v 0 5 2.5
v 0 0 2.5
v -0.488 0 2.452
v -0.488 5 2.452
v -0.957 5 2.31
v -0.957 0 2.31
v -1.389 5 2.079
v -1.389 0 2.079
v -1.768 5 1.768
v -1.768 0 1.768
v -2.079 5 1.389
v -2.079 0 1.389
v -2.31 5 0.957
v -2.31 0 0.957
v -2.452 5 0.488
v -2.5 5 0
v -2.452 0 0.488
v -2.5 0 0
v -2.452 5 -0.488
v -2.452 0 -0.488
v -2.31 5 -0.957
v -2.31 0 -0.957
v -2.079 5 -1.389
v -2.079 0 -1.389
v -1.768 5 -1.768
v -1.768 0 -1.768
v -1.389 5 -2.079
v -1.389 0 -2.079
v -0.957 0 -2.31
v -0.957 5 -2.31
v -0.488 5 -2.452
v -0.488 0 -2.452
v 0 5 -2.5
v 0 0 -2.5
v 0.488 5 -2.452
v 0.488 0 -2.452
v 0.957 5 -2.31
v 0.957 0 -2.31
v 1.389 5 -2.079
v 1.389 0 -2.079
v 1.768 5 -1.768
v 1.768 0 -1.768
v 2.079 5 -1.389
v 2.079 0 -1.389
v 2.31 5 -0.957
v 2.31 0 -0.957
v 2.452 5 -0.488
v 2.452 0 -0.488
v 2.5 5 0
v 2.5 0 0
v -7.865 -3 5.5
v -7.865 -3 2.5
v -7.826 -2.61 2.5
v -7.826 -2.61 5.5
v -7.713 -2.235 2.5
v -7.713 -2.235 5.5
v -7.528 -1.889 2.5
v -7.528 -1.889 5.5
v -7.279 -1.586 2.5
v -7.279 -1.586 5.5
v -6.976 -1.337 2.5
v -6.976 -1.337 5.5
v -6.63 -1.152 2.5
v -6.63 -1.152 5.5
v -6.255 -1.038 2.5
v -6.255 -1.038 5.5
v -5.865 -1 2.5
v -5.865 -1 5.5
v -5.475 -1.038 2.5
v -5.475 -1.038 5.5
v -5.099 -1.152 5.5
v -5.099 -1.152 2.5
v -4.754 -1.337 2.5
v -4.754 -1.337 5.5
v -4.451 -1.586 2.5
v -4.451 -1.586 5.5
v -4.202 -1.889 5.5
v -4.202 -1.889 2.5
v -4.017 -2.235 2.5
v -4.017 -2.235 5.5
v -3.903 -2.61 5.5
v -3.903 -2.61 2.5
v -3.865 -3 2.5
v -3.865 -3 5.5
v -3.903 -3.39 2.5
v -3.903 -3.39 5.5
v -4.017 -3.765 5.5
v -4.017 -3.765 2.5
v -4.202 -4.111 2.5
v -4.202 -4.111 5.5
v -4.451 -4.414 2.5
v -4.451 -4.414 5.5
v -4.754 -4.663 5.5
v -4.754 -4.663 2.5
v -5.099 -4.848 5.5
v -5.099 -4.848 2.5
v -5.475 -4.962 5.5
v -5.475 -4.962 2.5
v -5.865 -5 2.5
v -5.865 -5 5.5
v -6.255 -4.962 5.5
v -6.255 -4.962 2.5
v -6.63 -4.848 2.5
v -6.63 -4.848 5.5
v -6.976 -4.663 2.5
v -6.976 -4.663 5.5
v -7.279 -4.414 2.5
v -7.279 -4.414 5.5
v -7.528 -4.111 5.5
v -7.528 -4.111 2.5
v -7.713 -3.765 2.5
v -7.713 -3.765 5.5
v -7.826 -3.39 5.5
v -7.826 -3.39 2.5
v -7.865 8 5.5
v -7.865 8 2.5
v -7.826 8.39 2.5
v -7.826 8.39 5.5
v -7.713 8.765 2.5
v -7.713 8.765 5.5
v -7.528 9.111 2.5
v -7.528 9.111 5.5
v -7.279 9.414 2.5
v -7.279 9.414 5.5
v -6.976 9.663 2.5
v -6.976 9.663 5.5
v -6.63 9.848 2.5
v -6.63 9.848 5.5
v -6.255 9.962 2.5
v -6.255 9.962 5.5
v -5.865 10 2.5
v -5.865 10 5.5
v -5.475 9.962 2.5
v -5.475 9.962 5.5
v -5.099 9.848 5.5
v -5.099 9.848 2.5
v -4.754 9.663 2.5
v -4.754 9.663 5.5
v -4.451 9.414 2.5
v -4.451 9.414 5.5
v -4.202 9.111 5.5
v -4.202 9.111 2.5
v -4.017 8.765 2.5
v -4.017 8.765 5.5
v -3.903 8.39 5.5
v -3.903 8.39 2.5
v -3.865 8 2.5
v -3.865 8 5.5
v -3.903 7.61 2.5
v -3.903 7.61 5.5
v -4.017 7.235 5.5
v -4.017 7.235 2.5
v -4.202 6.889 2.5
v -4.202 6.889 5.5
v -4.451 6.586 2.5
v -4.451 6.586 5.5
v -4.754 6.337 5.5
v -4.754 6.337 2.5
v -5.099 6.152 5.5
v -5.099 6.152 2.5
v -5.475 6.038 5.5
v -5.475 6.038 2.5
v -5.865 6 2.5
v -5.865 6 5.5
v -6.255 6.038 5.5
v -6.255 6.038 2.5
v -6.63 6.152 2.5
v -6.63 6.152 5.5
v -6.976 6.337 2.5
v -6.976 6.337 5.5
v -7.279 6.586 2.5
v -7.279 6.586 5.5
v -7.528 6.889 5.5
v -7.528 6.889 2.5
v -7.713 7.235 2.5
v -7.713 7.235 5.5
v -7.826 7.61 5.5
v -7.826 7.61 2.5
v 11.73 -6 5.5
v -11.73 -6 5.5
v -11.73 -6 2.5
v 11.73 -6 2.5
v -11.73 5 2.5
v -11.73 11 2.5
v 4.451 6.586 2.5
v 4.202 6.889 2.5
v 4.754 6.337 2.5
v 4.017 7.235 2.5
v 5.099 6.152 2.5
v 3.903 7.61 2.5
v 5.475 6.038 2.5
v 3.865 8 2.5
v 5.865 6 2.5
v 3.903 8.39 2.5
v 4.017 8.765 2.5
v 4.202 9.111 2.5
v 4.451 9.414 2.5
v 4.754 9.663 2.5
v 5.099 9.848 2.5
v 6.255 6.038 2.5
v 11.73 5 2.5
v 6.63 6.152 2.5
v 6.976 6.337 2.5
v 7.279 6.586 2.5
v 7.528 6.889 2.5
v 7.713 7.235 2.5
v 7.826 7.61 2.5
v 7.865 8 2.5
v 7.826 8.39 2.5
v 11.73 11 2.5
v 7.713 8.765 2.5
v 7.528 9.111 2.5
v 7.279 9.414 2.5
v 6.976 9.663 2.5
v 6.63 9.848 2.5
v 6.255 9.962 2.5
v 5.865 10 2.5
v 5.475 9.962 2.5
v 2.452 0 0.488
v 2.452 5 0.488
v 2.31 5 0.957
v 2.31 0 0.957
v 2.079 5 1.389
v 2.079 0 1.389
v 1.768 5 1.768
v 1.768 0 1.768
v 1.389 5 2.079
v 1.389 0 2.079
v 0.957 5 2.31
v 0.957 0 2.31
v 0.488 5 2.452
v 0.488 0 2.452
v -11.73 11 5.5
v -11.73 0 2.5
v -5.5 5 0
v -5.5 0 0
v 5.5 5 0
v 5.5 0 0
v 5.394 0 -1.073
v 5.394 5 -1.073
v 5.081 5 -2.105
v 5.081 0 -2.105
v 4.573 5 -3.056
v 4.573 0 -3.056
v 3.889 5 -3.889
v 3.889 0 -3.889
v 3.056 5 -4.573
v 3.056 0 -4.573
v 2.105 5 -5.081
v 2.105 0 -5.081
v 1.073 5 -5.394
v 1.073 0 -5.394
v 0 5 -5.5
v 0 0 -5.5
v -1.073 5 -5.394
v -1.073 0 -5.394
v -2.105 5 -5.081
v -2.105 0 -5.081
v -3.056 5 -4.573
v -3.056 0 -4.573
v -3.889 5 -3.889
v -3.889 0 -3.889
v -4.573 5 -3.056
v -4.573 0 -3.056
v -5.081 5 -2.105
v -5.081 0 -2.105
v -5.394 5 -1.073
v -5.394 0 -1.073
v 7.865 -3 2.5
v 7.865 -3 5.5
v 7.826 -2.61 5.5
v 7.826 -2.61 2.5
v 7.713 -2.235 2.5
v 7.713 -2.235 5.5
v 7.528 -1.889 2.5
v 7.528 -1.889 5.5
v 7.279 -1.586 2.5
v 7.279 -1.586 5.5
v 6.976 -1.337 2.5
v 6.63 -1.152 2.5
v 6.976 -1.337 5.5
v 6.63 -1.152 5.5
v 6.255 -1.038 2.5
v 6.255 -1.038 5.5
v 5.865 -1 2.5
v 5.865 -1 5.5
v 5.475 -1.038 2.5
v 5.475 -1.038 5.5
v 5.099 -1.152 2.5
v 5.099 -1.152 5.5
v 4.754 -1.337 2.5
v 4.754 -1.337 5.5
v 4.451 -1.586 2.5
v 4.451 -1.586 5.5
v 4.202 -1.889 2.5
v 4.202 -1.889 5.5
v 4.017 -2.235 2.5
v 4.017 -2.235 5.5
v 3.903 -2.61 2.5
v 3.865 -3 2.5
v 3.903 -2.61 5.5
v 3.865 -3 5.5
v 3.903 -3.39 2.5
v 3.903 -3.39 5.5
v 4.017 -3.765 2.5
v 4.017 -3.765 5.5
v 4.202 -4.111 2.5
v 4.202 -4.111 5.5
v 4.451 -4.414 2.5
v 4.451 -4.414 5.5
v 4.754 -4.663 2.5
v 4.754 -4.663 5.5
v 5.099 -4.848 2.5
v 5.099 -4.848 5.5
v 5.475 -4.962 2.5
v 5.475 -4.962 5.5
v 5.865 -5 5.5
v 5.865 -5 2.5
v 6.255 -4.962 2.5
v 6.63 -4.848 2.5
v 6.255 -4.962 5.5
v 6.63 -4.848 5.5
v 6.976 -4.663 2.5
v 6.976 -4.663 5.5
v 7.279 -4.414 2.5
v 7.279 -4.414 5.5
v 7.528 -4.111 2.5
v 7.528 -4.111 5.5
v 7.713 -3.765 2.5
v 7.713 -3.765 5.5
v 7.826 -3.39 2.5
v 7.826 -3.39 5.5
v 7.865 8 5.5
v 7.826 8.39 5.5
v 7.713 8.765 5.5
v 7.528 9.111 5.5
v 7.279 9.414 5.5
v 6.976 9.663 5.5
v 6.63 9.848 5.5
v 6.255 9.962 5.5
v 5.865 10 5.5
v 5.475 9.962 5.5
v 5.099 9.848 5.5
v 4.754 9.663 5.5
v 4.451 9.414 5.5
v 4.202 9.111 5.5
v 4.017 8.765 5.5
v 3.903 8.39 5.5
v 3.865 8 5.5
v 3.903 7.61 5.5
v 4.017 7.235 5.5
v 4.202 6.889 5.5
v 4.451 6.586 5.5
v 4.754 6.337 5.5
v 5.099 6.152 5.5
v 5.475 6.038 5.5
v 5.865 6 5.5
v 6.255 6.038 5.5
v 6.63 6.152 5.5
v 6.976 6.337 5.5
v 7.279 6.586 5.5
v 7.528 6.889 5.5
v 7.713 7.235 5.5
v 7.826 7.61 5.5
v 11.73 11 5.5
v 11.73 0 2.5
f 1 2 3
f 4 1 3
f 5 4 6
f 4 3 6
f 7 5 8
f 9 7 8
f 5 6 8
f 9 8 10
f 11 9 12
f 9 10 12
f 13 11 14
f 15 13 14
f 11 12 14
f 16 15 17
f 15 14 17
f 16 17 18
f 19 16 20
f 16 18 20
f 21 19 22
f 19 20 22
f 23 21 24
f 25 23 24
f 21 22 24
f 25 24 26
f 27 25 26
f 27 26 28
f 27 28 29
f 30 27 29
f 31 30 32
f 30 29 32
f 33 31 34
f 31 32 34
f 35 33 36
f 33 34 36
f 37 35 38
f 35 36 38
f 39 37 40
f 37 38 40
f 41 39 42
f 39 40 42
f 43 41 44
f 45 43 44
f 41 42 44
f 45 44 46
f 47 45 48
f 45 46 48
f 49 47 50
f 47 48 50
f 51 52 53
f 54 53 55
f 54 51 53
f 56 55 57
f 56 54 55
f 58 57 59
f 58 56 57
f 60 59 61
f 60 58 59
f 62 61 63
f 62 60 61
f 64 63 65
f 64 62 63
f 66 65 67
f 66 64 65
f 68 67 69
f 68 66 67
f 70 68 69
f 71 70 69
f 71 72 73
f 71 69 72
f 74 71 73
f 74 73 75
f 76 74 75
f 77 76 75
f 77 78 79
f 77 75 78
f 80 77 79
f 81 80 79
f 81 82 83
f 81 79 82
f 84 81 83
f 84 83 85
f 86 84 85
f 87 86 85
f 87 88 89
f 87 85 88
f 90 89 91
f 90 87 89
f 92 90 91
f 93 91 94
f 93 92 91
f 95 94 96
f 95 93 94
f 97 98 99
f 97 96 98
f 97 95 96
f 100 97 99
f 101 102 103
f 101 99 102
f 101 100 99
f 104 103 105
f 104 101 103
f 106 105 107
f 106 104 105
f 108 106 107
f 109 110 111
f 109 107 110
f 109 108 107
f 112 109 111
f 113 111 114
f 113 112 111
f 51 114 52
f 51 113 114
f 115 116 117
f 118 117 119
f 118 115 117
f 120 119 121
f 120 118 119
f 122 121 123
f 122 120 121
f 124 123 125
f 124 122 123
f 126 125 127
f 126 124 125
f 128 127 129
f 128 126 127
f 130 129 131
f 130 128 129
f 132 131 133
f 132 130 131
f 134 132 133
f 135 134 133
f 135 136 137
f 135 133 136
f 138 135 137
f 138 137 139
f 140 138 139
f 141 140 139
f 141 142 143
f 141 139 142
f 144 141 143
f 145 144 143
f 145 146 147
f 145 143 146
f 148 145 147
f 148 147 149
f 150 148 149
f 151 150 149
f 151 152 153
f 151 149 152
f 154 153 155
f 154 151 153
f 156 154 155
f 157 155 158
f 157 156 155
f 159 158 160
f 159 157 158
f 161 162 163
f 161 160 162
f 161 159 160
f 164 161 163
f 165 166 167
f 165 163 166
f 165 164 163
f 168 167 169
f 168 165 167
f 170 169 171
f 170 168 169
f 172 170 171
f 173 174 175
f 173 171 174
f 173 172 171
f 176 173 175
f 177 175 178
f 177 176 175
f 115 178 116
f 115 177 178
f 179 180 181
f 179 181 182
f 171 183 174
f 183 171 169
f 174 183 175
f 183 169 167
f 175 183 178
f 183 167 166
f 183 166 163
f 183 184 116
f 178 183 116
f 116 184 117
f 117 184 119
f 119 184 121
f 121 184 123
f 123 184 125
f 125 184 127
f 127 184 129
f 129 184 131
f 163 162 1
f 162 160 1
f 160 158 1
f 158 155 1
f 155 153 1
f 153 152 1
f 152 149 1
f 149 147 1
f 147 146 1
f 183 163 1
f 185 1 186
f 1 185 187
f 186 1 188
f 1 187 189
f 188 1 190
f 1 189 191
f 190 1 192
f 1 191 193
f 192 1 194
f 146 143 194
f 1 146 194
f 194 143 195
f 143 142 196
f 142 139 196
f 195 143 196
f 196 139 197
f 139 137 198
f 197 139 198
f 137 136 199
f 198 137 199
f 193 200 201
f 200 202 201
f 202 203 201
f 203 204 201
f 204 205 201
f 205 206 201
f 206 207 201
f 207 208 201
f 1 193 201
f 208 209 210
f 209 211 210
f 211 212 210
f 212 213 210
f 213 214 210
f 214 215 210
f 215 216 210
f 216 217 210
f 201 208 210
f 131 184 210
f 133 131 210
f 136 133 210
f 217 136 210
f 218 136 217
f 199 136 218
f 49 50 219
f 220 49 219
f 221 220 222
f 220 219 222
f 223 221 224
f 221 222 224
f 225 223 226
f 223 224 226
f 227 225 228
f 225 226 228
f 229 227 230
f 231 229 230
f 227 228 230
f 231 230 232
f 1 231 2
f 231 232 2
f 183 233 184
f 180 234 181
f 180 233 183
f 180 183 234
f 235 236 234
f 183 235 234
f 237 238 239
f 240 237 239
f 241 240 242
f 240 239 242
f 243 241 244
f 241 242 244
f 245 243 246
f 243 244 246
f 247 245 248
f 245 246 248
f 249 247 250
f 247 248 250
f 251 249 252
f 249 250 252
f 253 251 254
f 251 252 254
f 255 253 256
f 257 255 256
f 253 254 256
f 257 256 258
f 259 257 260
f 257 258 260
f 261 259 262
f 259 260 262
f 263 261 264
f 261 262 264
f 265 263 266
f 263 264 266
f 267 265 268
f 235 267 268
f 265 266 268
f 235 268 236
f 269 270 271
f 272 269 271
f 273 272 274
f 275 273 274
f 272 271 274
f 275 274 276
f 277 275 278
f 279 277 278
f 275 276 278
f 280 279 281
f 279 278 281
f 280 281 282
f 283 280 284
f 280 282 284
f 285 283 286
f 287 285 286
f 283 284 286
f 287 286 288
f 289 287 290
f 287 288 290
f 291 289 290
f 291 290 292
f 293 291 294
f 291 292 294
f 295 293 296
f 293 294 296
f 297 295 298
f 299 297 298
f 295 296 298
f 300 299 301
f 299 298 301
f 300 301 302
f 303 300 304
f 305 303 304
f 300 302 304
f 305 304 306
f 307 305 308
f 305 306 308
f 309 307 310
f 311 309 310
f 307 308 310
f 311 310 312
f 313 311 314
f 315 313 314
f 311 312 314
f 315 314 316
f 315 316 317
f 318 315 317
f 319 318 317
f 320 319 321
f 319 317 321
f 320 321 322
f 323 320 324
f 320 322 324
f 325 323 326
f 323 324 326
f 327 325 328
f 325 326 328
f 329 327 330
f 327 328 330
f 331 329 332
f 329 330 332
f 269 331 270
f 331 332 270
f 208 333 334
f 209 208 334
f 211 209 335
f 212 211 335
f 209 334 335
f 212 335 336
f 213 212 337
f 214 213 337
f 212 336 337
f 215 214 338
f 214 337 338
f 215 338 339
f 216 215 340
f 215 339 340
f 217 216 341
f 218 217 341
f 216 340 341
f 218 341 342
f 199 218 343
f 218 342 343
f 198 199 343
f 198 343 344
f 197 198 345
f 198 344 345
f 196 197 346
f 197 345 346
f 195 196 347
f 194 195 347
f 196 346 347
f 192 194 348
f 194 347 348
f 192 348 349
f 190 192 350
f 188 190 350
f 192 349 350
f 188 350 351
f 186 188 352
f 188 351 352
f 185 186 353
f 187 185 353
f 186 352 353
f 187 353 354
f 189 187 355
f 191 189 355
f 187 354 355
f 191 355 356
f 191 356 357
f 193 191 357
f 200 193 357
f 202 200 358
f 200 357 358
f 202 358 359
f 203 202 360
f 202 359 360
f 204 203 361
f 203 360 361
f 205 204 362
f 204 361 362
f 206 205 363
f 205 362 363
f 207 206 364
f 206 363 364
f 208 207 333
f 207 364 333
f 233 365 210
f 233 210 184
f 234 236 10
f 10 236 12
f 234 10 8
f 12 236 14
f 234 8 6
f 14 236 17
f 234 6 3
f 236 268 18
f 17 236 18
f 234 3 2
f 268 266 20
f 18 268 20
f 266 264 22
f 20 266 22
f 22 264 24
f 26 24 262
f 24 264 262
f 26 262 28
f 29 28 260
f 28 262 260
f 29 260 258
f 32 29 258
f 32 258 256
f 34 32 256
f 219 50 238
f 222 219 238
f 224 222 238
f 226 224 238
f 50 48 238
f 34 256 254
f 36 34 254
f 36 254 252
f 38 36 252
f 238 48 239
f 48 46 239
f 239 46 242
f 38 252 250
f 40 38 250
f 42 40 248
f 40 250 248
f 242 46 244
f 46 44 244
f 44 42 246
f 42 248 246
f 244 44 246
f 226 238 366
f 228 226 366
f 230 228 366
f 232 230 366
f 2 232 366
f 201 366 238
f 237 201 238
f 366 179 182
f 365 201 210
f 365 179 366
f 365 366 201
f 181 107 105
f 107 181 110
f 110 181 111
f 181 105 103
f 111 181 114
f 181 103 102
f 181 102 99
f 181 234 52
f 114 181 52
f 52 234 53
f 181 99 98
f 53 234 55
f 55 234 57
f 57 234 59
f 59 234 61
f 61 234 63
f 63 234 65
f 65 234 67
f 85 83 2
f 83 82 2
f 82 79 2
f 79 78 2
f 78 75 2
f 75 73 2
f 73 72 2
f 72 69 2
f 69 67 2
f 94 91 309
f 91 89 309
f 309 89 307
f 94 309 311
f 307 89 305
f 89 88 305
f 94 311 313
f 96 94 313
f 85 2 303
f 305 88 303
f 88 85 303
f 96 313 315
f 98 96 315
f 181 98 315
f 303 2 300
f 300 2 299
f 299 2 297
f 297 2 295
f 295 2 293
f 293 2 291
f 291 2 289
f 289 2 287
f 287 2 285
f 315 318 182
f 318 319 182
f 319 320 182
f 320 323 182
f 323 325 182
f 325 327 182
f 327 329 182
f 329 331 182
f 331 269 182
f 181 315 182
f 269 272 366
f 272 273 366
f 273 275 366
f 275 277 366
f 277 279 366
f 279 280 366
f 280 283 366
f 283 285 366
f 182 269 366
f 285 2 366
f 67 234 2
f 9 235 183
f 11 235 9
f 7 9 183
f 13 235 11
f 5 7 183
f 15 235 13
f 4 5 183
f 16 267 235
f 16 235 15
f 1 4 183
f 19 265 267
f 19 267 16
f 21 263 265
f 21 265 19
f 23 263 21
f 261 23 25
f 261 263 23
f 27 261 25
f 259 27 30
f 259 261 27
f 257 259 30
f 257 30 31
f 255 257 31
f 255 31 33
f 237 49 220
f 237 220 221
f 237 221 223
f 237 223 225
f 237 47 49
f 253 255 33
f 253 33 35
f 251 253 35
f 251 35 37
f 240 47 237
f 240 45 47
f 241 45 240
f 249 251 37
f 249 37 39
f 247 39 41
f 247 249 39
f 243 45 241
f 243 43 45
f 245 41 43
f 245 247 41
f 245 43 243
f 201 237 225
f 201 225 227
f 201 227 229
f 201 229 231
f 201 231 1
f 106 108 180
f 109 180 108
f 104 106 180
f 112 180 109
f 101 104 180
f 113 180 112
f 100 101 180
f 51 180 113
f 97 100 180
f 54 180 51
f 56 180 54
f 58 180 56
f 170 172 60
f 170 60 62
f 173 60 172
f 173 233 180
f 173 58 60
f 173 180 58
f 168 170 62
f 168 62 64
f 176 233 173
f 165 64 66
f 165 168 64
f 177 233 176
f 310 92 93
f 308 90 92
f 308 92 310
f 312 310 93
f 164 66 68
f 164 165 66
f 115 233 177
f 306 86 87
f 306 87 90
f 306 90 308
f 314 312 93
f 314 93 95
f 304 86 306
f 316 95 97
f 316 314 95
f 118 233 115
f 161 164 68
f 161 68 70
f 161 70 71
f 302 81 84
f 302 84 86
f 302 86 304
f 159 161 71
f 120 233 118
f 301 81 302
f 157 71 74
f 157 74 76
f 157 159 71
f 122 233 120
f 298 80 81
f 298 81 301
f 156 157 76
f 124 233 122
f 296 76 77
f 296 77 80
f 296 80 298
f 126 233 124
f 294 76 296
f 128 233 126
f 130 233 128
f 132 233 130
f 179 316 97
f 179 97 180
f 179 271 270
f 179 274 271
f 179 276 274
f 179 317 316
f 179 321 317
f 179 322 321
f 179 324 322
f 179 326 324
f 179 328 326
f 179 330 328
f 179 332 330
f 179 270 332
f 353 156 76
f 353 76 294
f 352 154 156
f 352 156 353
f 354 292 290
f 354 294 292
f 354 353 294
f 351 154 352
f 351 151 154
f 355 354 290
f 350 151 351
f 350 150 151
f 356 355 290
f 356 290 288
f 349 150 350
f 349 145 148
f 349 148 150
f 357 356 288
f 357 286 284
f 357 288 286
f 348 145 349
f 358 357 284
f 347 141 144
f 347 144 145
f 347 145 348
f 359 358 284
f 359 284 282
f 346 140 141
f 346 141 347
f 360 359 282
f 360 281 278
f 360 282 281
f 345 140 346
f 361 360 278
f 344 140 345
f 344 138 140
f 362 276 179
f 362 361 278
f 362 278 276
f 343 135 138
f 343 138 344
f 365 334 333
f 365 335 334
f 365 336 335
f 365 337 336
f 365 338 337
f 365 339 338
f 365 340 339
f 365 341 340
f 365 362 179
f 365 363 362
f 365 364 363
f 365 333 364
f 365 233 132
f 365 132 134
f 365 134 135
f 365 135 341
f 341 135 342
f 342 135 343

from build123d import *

# Parameters (mm, degrees)
BOSS_EXTRUDE1_DEPTH = 5
SKETCH2_R           = 2
CUT_EXTRUDE1_DEPTH  = 5
SKETCH5_W           = 10
SKETCH5_H           = 5
CUT_EXTRUDE2_DEPTH  = 5
SKETCH6_R           = 2
BOSS_EXTRUDE4_DEPTH = 3


with BuildPart() as part:
    # Sketch1 → Boss-Extrude1 (new body)
    # profile 1 of 9: a face of its own
    with BuildSketch(Plane(origin=(0, 0, 0), x_dir=(1, 0, 0), z_dir=(0, 1, 0))):
        with BuildLine():
            ThreePointArc((4.898979486, -2.5), (5.347634392, -1.285615189), (5.5, 0))
            ThreePointArc((5.5, 0), (0, 5.5), (-5.5, 0))
            ThreePointArc((-5.5, 0), (-5.347634392, -1.285615189), (-4.898979486, -2.5))
            Line((-4.898979486, -2.5), (0, -2.5))
            Line((0, -2.5), (4.898979486, -2.5))
        make_face()
        with BuildLine():
            ThreePointArc((2.5, 0), (1.767766953, -1.767766953), (0, -2.5))
            ThreePointArc((0, -2.5), (-1.767766953, 1.767766953), (2.5, 0))
        make_face(mode=Mode.SUBTRACT)
    # profile 2 of 9: a face of its own
    with BuildSketch(Plane(origin=(0, 0, 0), x_dir=(1, 0, 0), z_dir=(0, 1, 0))):
        with BuildLine():
            ThreePointArc((0, -5.5), (2.872281323, -4.69041576), (4.898979486, -2.5))
            Line((4.898979486, -2.5), (0, -2.5))
            Line((0, -2.5), (0, -5.5))
        make_face()
    # profile 3 of 9: a face of its own
    with BuildSketch(Plane(origin=(0, 0, 0), x_dir=(1, 0, 0), z_dir=(0, 1, 0))):
        with BuildLine():
            Line((0, -2.5), (-4.898979486, -2.5))
            ThreePointArc((-4.898979486, -2.5), (-2.872281323, -4.69041576), (0, -5.5))
            Line((0, -5.5), (0, -2.5))
        make_face()
    # profile 4 of 9: a face of its own
    with BuildSketch(Plane(origin=(0, 0, 0), x_dir=(1, 0, 0), z_dir=(0, 1, 0))):
        with BuildLine():
            Line((25.742031851, -2.5), (11.729658022, -2.5))
            Line((11.729658022, -2.5), (4.898979486, -2.5))
            ThreePointArc((4.898979486, -2.5), (2.872281323, -4.69041576), (0, -5.5))
            Line((0, -5.5), (25.742031851, -5.5))
            Line((25.742031851, -5.5), (25.742031851, -2.5))
        make_face()
    # profile 5 of 9: a face of its own
    with BuildSketch(Plane(origin=(0, 0, 0), x_dir=(1, 0, 0), z_dir=(0, 1, 0))):
        with BuildLine():
            Line((11.729658022, -2.5), (5.5, 0))
            ThreePointArc((5.5, 0), (5.347634392, -1.285615189), (4.898979486, -2.5))
            Line((4.898979486, -2.5), (11.729658022, -2.5))
        make_face()
    # profile 6 of 9: a face of its own
    with BuildSketch(Plane(origin=(0, 0, 0), x_dir=(1, 0, 0), z_dir=(0, 1, 0))):
        with BuildLine():
            ThreePointArc((0, -5.5), (2.872281323, -4.69041576), (4.898979486, -2.5))
            Line((4.898979486, -2.5), (0, -2.5))
            Line((0, -2.5), (0, -5.5))
        make_face()
    # profile 7 of 9: a face of its own
    with BuildSketch(Plane(origin=(0, 0, 0), x_dir=(1, 0, 0), z_dir=(0, 1, 0))):
        with BuildLine():
            Line((0, -2.5), (-4.898979486, -2.5))
            ThreePointArc((-4.898979486, -2.5), (-2.872281323, -4.69041576), (0, -5.5))
            Line((0, -5.5), (0, -2.5))
        make_face()
    # profile 8 of 9: a face of its own
    with BuildSketch(Plane(origin=(0, 0, 0), x_dir=(1, 0, 0), z_dir=(0, 1, 0))):
        with BuildLine():
            ThreePointArc((-4.898979486, -2.5), (-5.347634392, -1.285615189), (-5.5, 0))
            Line((-5.5, 0), (-11.729658022, -2.5))
            Line((-11.729658022, -2.5), (-4.898979486, -2.5))
        make_face()
    # profile 9 of 9: a face of its own
    with BuildSketch(Plane(origin=(0, 0, 0), x_dir=(1, 0, 0), z_dir=(0, 1, 0))):
        with BuildLine():
            Line((-4.898979486, -2.5), (-11.729658022, -2.5))
            Line((-11.729658022, -2.5), (-25.742031851, -2.5))
            Line((-25.742031851, -2.5), (-25.742031851, -5.5))
            Line((-25.742031851, -5.5), (0, -5.5))
            ThreePointArc((0, -5.5), (-2.872281323, -4.69041576), (-4.898979486, -2.5))
        make_face()
    extrude(amount=BOSS_EXTRUDE1_DEPTH)

    # Sketch2 → Cut-Extrude1 (cut)
    with BuildSketch(Plane(origin=(0, 0, 2.5), x_dir=(-1, 0, 0), z_dir=(0, 0, -1))):
        Polygon((-25.742031851, 0), (-21.729658022, 0), (-21.729658022, 2.5), (-21.729658022, 5), (-25.742031851, 5), align=None)
        Polygon((21.729658022, 2.5), (21.729658022, 0), (25.742031851, 0), (25.742031851, 5), (21.729658022, 5), align=None)
        with Locations((16.729658022, 2.5)):
            Circle(SKETCH2_R)
        with Locations((-16.729658022, 2.5)):
            Circle(SKETCH2_R)
    extrude(amount=-CUT_EXTRUDE1_DEPTH, mode=Mode.SUBTRACT)

    # Sketch5 → Cut-Extrude2 (cut)
    with BuildSketch(Plane(origin=(0, 0, 2.5), x_dir=(-1, 0, 0), z_dir=(0, 0, -1))):
        with Locations((-16.729658022, 2.5)):
            Rectangle(SKETCH5_W, SKETCH5_H)
        with Locations((16.729658022, 2.5)):
            Rectangle(SKETCH5_W, SKETCH5_H)
    extrude(amount=-CUT_EXTRUDE2_DEPTH, mode=Mode.SUBTRACT)

    # Sketch6 → Boss-Extrude4 (add)
    # profile 1 of 6: a face of its own
    with BuildSketch(Plane.XY.offset(5.5)):
        Polygon((11.729658022, 11), (0, 11), (0, 8), (0, 5), (11.729658022, 5), align=None)
        with Locations((5.864829011, 8)):
            Circle(SKETCH6_R, mode=Mode.SUBTRACT)
    # profile 2 of 6: a face of its own
    with BuildSketch(Plane.XY.offset(5.5)):
        Polygon((0, 0), (0, -3), (0, -6), (11.729658022, -6), (11.729658022, 0), align=None)
        with Locations((5.864829011, -3)):
            Circle(SKETCH6_R, mode=Mode.SUBTRACT)
    # profile 3 of 6: a face of its own
    with BuildSketch(Plane.XY.offset(5.5)):
        with BuildLine():
            Line((0, 5), (0, 8))
            Line((0, 8), (-3.864829011, 8))
            ThreePointArc((-3.864829011, 8), (-5.864829011, 6), (-7.864829011, 8))
            Line((-7.864829011, 8), (-11.729658022, 8))
            Line((-11.729658022, 8), (-11.729658022, 5))
            Line((-11.729658022, 5), (0, 5))
        make_face()
    # profile 4 of 6: a face of its own
    with BuildSketch(Plane.XY.offset(5.5)):
        with BuildLine():
            Line((0, 8), (0, 11))
            Line((0, 11), (-11.729658022, 11))
            Line((-11.729658022, 11), (-11.729658022, 8))
            Line((-11.729658022, 8), (-7.864829011, 8))
            ThreePointArc((-7.864829011, 8), (-5.864829011, 10), (-3.864829011, 8))
            Line((-3.864829011, 8), (0, 8))
        make_face()
    # profile 5 of 6: a face of its own
    with BuildSketch(Plane.XY.offset(5.5)):
        with BuildLine():
            ThreePointArc((-7.864829011, -3), (-5.864829011, -1), (-3.864829011, -3))
            Line((-3.864829011, -3), (0, -3))
            Line((0, -3), (0, 0))
            Line((0, 0), (-11.729658022, 0))
            Line((-11.729658022, 0), (-11.729658022, -3))
            Line((-11.729658022, -3), (-7.864829011, -3))
        make_face()
    # profile 6 of 6: a face of its own
    with BuildSketch(Plane.XY.offset(5.5)):
        with BuildLine():
            Line((0, -3), (-3.864829011, -3))
            ThreePointArc((-3.864829011, -3), (-5.864829011, -5), (-7.864829011, -3))
            Line((-7.864829011, -3), (-11.729658022, -3))
            Line((-11.729658022, -3), (-11.729658022, -6))
            Line((-11.729658022, -6), (0, -6))
            Line((0, -6), (0, -3))
        make_face()
    extrude(amount=-BOSS_EXTRUDE4_DEPTH)


solid = part.part
